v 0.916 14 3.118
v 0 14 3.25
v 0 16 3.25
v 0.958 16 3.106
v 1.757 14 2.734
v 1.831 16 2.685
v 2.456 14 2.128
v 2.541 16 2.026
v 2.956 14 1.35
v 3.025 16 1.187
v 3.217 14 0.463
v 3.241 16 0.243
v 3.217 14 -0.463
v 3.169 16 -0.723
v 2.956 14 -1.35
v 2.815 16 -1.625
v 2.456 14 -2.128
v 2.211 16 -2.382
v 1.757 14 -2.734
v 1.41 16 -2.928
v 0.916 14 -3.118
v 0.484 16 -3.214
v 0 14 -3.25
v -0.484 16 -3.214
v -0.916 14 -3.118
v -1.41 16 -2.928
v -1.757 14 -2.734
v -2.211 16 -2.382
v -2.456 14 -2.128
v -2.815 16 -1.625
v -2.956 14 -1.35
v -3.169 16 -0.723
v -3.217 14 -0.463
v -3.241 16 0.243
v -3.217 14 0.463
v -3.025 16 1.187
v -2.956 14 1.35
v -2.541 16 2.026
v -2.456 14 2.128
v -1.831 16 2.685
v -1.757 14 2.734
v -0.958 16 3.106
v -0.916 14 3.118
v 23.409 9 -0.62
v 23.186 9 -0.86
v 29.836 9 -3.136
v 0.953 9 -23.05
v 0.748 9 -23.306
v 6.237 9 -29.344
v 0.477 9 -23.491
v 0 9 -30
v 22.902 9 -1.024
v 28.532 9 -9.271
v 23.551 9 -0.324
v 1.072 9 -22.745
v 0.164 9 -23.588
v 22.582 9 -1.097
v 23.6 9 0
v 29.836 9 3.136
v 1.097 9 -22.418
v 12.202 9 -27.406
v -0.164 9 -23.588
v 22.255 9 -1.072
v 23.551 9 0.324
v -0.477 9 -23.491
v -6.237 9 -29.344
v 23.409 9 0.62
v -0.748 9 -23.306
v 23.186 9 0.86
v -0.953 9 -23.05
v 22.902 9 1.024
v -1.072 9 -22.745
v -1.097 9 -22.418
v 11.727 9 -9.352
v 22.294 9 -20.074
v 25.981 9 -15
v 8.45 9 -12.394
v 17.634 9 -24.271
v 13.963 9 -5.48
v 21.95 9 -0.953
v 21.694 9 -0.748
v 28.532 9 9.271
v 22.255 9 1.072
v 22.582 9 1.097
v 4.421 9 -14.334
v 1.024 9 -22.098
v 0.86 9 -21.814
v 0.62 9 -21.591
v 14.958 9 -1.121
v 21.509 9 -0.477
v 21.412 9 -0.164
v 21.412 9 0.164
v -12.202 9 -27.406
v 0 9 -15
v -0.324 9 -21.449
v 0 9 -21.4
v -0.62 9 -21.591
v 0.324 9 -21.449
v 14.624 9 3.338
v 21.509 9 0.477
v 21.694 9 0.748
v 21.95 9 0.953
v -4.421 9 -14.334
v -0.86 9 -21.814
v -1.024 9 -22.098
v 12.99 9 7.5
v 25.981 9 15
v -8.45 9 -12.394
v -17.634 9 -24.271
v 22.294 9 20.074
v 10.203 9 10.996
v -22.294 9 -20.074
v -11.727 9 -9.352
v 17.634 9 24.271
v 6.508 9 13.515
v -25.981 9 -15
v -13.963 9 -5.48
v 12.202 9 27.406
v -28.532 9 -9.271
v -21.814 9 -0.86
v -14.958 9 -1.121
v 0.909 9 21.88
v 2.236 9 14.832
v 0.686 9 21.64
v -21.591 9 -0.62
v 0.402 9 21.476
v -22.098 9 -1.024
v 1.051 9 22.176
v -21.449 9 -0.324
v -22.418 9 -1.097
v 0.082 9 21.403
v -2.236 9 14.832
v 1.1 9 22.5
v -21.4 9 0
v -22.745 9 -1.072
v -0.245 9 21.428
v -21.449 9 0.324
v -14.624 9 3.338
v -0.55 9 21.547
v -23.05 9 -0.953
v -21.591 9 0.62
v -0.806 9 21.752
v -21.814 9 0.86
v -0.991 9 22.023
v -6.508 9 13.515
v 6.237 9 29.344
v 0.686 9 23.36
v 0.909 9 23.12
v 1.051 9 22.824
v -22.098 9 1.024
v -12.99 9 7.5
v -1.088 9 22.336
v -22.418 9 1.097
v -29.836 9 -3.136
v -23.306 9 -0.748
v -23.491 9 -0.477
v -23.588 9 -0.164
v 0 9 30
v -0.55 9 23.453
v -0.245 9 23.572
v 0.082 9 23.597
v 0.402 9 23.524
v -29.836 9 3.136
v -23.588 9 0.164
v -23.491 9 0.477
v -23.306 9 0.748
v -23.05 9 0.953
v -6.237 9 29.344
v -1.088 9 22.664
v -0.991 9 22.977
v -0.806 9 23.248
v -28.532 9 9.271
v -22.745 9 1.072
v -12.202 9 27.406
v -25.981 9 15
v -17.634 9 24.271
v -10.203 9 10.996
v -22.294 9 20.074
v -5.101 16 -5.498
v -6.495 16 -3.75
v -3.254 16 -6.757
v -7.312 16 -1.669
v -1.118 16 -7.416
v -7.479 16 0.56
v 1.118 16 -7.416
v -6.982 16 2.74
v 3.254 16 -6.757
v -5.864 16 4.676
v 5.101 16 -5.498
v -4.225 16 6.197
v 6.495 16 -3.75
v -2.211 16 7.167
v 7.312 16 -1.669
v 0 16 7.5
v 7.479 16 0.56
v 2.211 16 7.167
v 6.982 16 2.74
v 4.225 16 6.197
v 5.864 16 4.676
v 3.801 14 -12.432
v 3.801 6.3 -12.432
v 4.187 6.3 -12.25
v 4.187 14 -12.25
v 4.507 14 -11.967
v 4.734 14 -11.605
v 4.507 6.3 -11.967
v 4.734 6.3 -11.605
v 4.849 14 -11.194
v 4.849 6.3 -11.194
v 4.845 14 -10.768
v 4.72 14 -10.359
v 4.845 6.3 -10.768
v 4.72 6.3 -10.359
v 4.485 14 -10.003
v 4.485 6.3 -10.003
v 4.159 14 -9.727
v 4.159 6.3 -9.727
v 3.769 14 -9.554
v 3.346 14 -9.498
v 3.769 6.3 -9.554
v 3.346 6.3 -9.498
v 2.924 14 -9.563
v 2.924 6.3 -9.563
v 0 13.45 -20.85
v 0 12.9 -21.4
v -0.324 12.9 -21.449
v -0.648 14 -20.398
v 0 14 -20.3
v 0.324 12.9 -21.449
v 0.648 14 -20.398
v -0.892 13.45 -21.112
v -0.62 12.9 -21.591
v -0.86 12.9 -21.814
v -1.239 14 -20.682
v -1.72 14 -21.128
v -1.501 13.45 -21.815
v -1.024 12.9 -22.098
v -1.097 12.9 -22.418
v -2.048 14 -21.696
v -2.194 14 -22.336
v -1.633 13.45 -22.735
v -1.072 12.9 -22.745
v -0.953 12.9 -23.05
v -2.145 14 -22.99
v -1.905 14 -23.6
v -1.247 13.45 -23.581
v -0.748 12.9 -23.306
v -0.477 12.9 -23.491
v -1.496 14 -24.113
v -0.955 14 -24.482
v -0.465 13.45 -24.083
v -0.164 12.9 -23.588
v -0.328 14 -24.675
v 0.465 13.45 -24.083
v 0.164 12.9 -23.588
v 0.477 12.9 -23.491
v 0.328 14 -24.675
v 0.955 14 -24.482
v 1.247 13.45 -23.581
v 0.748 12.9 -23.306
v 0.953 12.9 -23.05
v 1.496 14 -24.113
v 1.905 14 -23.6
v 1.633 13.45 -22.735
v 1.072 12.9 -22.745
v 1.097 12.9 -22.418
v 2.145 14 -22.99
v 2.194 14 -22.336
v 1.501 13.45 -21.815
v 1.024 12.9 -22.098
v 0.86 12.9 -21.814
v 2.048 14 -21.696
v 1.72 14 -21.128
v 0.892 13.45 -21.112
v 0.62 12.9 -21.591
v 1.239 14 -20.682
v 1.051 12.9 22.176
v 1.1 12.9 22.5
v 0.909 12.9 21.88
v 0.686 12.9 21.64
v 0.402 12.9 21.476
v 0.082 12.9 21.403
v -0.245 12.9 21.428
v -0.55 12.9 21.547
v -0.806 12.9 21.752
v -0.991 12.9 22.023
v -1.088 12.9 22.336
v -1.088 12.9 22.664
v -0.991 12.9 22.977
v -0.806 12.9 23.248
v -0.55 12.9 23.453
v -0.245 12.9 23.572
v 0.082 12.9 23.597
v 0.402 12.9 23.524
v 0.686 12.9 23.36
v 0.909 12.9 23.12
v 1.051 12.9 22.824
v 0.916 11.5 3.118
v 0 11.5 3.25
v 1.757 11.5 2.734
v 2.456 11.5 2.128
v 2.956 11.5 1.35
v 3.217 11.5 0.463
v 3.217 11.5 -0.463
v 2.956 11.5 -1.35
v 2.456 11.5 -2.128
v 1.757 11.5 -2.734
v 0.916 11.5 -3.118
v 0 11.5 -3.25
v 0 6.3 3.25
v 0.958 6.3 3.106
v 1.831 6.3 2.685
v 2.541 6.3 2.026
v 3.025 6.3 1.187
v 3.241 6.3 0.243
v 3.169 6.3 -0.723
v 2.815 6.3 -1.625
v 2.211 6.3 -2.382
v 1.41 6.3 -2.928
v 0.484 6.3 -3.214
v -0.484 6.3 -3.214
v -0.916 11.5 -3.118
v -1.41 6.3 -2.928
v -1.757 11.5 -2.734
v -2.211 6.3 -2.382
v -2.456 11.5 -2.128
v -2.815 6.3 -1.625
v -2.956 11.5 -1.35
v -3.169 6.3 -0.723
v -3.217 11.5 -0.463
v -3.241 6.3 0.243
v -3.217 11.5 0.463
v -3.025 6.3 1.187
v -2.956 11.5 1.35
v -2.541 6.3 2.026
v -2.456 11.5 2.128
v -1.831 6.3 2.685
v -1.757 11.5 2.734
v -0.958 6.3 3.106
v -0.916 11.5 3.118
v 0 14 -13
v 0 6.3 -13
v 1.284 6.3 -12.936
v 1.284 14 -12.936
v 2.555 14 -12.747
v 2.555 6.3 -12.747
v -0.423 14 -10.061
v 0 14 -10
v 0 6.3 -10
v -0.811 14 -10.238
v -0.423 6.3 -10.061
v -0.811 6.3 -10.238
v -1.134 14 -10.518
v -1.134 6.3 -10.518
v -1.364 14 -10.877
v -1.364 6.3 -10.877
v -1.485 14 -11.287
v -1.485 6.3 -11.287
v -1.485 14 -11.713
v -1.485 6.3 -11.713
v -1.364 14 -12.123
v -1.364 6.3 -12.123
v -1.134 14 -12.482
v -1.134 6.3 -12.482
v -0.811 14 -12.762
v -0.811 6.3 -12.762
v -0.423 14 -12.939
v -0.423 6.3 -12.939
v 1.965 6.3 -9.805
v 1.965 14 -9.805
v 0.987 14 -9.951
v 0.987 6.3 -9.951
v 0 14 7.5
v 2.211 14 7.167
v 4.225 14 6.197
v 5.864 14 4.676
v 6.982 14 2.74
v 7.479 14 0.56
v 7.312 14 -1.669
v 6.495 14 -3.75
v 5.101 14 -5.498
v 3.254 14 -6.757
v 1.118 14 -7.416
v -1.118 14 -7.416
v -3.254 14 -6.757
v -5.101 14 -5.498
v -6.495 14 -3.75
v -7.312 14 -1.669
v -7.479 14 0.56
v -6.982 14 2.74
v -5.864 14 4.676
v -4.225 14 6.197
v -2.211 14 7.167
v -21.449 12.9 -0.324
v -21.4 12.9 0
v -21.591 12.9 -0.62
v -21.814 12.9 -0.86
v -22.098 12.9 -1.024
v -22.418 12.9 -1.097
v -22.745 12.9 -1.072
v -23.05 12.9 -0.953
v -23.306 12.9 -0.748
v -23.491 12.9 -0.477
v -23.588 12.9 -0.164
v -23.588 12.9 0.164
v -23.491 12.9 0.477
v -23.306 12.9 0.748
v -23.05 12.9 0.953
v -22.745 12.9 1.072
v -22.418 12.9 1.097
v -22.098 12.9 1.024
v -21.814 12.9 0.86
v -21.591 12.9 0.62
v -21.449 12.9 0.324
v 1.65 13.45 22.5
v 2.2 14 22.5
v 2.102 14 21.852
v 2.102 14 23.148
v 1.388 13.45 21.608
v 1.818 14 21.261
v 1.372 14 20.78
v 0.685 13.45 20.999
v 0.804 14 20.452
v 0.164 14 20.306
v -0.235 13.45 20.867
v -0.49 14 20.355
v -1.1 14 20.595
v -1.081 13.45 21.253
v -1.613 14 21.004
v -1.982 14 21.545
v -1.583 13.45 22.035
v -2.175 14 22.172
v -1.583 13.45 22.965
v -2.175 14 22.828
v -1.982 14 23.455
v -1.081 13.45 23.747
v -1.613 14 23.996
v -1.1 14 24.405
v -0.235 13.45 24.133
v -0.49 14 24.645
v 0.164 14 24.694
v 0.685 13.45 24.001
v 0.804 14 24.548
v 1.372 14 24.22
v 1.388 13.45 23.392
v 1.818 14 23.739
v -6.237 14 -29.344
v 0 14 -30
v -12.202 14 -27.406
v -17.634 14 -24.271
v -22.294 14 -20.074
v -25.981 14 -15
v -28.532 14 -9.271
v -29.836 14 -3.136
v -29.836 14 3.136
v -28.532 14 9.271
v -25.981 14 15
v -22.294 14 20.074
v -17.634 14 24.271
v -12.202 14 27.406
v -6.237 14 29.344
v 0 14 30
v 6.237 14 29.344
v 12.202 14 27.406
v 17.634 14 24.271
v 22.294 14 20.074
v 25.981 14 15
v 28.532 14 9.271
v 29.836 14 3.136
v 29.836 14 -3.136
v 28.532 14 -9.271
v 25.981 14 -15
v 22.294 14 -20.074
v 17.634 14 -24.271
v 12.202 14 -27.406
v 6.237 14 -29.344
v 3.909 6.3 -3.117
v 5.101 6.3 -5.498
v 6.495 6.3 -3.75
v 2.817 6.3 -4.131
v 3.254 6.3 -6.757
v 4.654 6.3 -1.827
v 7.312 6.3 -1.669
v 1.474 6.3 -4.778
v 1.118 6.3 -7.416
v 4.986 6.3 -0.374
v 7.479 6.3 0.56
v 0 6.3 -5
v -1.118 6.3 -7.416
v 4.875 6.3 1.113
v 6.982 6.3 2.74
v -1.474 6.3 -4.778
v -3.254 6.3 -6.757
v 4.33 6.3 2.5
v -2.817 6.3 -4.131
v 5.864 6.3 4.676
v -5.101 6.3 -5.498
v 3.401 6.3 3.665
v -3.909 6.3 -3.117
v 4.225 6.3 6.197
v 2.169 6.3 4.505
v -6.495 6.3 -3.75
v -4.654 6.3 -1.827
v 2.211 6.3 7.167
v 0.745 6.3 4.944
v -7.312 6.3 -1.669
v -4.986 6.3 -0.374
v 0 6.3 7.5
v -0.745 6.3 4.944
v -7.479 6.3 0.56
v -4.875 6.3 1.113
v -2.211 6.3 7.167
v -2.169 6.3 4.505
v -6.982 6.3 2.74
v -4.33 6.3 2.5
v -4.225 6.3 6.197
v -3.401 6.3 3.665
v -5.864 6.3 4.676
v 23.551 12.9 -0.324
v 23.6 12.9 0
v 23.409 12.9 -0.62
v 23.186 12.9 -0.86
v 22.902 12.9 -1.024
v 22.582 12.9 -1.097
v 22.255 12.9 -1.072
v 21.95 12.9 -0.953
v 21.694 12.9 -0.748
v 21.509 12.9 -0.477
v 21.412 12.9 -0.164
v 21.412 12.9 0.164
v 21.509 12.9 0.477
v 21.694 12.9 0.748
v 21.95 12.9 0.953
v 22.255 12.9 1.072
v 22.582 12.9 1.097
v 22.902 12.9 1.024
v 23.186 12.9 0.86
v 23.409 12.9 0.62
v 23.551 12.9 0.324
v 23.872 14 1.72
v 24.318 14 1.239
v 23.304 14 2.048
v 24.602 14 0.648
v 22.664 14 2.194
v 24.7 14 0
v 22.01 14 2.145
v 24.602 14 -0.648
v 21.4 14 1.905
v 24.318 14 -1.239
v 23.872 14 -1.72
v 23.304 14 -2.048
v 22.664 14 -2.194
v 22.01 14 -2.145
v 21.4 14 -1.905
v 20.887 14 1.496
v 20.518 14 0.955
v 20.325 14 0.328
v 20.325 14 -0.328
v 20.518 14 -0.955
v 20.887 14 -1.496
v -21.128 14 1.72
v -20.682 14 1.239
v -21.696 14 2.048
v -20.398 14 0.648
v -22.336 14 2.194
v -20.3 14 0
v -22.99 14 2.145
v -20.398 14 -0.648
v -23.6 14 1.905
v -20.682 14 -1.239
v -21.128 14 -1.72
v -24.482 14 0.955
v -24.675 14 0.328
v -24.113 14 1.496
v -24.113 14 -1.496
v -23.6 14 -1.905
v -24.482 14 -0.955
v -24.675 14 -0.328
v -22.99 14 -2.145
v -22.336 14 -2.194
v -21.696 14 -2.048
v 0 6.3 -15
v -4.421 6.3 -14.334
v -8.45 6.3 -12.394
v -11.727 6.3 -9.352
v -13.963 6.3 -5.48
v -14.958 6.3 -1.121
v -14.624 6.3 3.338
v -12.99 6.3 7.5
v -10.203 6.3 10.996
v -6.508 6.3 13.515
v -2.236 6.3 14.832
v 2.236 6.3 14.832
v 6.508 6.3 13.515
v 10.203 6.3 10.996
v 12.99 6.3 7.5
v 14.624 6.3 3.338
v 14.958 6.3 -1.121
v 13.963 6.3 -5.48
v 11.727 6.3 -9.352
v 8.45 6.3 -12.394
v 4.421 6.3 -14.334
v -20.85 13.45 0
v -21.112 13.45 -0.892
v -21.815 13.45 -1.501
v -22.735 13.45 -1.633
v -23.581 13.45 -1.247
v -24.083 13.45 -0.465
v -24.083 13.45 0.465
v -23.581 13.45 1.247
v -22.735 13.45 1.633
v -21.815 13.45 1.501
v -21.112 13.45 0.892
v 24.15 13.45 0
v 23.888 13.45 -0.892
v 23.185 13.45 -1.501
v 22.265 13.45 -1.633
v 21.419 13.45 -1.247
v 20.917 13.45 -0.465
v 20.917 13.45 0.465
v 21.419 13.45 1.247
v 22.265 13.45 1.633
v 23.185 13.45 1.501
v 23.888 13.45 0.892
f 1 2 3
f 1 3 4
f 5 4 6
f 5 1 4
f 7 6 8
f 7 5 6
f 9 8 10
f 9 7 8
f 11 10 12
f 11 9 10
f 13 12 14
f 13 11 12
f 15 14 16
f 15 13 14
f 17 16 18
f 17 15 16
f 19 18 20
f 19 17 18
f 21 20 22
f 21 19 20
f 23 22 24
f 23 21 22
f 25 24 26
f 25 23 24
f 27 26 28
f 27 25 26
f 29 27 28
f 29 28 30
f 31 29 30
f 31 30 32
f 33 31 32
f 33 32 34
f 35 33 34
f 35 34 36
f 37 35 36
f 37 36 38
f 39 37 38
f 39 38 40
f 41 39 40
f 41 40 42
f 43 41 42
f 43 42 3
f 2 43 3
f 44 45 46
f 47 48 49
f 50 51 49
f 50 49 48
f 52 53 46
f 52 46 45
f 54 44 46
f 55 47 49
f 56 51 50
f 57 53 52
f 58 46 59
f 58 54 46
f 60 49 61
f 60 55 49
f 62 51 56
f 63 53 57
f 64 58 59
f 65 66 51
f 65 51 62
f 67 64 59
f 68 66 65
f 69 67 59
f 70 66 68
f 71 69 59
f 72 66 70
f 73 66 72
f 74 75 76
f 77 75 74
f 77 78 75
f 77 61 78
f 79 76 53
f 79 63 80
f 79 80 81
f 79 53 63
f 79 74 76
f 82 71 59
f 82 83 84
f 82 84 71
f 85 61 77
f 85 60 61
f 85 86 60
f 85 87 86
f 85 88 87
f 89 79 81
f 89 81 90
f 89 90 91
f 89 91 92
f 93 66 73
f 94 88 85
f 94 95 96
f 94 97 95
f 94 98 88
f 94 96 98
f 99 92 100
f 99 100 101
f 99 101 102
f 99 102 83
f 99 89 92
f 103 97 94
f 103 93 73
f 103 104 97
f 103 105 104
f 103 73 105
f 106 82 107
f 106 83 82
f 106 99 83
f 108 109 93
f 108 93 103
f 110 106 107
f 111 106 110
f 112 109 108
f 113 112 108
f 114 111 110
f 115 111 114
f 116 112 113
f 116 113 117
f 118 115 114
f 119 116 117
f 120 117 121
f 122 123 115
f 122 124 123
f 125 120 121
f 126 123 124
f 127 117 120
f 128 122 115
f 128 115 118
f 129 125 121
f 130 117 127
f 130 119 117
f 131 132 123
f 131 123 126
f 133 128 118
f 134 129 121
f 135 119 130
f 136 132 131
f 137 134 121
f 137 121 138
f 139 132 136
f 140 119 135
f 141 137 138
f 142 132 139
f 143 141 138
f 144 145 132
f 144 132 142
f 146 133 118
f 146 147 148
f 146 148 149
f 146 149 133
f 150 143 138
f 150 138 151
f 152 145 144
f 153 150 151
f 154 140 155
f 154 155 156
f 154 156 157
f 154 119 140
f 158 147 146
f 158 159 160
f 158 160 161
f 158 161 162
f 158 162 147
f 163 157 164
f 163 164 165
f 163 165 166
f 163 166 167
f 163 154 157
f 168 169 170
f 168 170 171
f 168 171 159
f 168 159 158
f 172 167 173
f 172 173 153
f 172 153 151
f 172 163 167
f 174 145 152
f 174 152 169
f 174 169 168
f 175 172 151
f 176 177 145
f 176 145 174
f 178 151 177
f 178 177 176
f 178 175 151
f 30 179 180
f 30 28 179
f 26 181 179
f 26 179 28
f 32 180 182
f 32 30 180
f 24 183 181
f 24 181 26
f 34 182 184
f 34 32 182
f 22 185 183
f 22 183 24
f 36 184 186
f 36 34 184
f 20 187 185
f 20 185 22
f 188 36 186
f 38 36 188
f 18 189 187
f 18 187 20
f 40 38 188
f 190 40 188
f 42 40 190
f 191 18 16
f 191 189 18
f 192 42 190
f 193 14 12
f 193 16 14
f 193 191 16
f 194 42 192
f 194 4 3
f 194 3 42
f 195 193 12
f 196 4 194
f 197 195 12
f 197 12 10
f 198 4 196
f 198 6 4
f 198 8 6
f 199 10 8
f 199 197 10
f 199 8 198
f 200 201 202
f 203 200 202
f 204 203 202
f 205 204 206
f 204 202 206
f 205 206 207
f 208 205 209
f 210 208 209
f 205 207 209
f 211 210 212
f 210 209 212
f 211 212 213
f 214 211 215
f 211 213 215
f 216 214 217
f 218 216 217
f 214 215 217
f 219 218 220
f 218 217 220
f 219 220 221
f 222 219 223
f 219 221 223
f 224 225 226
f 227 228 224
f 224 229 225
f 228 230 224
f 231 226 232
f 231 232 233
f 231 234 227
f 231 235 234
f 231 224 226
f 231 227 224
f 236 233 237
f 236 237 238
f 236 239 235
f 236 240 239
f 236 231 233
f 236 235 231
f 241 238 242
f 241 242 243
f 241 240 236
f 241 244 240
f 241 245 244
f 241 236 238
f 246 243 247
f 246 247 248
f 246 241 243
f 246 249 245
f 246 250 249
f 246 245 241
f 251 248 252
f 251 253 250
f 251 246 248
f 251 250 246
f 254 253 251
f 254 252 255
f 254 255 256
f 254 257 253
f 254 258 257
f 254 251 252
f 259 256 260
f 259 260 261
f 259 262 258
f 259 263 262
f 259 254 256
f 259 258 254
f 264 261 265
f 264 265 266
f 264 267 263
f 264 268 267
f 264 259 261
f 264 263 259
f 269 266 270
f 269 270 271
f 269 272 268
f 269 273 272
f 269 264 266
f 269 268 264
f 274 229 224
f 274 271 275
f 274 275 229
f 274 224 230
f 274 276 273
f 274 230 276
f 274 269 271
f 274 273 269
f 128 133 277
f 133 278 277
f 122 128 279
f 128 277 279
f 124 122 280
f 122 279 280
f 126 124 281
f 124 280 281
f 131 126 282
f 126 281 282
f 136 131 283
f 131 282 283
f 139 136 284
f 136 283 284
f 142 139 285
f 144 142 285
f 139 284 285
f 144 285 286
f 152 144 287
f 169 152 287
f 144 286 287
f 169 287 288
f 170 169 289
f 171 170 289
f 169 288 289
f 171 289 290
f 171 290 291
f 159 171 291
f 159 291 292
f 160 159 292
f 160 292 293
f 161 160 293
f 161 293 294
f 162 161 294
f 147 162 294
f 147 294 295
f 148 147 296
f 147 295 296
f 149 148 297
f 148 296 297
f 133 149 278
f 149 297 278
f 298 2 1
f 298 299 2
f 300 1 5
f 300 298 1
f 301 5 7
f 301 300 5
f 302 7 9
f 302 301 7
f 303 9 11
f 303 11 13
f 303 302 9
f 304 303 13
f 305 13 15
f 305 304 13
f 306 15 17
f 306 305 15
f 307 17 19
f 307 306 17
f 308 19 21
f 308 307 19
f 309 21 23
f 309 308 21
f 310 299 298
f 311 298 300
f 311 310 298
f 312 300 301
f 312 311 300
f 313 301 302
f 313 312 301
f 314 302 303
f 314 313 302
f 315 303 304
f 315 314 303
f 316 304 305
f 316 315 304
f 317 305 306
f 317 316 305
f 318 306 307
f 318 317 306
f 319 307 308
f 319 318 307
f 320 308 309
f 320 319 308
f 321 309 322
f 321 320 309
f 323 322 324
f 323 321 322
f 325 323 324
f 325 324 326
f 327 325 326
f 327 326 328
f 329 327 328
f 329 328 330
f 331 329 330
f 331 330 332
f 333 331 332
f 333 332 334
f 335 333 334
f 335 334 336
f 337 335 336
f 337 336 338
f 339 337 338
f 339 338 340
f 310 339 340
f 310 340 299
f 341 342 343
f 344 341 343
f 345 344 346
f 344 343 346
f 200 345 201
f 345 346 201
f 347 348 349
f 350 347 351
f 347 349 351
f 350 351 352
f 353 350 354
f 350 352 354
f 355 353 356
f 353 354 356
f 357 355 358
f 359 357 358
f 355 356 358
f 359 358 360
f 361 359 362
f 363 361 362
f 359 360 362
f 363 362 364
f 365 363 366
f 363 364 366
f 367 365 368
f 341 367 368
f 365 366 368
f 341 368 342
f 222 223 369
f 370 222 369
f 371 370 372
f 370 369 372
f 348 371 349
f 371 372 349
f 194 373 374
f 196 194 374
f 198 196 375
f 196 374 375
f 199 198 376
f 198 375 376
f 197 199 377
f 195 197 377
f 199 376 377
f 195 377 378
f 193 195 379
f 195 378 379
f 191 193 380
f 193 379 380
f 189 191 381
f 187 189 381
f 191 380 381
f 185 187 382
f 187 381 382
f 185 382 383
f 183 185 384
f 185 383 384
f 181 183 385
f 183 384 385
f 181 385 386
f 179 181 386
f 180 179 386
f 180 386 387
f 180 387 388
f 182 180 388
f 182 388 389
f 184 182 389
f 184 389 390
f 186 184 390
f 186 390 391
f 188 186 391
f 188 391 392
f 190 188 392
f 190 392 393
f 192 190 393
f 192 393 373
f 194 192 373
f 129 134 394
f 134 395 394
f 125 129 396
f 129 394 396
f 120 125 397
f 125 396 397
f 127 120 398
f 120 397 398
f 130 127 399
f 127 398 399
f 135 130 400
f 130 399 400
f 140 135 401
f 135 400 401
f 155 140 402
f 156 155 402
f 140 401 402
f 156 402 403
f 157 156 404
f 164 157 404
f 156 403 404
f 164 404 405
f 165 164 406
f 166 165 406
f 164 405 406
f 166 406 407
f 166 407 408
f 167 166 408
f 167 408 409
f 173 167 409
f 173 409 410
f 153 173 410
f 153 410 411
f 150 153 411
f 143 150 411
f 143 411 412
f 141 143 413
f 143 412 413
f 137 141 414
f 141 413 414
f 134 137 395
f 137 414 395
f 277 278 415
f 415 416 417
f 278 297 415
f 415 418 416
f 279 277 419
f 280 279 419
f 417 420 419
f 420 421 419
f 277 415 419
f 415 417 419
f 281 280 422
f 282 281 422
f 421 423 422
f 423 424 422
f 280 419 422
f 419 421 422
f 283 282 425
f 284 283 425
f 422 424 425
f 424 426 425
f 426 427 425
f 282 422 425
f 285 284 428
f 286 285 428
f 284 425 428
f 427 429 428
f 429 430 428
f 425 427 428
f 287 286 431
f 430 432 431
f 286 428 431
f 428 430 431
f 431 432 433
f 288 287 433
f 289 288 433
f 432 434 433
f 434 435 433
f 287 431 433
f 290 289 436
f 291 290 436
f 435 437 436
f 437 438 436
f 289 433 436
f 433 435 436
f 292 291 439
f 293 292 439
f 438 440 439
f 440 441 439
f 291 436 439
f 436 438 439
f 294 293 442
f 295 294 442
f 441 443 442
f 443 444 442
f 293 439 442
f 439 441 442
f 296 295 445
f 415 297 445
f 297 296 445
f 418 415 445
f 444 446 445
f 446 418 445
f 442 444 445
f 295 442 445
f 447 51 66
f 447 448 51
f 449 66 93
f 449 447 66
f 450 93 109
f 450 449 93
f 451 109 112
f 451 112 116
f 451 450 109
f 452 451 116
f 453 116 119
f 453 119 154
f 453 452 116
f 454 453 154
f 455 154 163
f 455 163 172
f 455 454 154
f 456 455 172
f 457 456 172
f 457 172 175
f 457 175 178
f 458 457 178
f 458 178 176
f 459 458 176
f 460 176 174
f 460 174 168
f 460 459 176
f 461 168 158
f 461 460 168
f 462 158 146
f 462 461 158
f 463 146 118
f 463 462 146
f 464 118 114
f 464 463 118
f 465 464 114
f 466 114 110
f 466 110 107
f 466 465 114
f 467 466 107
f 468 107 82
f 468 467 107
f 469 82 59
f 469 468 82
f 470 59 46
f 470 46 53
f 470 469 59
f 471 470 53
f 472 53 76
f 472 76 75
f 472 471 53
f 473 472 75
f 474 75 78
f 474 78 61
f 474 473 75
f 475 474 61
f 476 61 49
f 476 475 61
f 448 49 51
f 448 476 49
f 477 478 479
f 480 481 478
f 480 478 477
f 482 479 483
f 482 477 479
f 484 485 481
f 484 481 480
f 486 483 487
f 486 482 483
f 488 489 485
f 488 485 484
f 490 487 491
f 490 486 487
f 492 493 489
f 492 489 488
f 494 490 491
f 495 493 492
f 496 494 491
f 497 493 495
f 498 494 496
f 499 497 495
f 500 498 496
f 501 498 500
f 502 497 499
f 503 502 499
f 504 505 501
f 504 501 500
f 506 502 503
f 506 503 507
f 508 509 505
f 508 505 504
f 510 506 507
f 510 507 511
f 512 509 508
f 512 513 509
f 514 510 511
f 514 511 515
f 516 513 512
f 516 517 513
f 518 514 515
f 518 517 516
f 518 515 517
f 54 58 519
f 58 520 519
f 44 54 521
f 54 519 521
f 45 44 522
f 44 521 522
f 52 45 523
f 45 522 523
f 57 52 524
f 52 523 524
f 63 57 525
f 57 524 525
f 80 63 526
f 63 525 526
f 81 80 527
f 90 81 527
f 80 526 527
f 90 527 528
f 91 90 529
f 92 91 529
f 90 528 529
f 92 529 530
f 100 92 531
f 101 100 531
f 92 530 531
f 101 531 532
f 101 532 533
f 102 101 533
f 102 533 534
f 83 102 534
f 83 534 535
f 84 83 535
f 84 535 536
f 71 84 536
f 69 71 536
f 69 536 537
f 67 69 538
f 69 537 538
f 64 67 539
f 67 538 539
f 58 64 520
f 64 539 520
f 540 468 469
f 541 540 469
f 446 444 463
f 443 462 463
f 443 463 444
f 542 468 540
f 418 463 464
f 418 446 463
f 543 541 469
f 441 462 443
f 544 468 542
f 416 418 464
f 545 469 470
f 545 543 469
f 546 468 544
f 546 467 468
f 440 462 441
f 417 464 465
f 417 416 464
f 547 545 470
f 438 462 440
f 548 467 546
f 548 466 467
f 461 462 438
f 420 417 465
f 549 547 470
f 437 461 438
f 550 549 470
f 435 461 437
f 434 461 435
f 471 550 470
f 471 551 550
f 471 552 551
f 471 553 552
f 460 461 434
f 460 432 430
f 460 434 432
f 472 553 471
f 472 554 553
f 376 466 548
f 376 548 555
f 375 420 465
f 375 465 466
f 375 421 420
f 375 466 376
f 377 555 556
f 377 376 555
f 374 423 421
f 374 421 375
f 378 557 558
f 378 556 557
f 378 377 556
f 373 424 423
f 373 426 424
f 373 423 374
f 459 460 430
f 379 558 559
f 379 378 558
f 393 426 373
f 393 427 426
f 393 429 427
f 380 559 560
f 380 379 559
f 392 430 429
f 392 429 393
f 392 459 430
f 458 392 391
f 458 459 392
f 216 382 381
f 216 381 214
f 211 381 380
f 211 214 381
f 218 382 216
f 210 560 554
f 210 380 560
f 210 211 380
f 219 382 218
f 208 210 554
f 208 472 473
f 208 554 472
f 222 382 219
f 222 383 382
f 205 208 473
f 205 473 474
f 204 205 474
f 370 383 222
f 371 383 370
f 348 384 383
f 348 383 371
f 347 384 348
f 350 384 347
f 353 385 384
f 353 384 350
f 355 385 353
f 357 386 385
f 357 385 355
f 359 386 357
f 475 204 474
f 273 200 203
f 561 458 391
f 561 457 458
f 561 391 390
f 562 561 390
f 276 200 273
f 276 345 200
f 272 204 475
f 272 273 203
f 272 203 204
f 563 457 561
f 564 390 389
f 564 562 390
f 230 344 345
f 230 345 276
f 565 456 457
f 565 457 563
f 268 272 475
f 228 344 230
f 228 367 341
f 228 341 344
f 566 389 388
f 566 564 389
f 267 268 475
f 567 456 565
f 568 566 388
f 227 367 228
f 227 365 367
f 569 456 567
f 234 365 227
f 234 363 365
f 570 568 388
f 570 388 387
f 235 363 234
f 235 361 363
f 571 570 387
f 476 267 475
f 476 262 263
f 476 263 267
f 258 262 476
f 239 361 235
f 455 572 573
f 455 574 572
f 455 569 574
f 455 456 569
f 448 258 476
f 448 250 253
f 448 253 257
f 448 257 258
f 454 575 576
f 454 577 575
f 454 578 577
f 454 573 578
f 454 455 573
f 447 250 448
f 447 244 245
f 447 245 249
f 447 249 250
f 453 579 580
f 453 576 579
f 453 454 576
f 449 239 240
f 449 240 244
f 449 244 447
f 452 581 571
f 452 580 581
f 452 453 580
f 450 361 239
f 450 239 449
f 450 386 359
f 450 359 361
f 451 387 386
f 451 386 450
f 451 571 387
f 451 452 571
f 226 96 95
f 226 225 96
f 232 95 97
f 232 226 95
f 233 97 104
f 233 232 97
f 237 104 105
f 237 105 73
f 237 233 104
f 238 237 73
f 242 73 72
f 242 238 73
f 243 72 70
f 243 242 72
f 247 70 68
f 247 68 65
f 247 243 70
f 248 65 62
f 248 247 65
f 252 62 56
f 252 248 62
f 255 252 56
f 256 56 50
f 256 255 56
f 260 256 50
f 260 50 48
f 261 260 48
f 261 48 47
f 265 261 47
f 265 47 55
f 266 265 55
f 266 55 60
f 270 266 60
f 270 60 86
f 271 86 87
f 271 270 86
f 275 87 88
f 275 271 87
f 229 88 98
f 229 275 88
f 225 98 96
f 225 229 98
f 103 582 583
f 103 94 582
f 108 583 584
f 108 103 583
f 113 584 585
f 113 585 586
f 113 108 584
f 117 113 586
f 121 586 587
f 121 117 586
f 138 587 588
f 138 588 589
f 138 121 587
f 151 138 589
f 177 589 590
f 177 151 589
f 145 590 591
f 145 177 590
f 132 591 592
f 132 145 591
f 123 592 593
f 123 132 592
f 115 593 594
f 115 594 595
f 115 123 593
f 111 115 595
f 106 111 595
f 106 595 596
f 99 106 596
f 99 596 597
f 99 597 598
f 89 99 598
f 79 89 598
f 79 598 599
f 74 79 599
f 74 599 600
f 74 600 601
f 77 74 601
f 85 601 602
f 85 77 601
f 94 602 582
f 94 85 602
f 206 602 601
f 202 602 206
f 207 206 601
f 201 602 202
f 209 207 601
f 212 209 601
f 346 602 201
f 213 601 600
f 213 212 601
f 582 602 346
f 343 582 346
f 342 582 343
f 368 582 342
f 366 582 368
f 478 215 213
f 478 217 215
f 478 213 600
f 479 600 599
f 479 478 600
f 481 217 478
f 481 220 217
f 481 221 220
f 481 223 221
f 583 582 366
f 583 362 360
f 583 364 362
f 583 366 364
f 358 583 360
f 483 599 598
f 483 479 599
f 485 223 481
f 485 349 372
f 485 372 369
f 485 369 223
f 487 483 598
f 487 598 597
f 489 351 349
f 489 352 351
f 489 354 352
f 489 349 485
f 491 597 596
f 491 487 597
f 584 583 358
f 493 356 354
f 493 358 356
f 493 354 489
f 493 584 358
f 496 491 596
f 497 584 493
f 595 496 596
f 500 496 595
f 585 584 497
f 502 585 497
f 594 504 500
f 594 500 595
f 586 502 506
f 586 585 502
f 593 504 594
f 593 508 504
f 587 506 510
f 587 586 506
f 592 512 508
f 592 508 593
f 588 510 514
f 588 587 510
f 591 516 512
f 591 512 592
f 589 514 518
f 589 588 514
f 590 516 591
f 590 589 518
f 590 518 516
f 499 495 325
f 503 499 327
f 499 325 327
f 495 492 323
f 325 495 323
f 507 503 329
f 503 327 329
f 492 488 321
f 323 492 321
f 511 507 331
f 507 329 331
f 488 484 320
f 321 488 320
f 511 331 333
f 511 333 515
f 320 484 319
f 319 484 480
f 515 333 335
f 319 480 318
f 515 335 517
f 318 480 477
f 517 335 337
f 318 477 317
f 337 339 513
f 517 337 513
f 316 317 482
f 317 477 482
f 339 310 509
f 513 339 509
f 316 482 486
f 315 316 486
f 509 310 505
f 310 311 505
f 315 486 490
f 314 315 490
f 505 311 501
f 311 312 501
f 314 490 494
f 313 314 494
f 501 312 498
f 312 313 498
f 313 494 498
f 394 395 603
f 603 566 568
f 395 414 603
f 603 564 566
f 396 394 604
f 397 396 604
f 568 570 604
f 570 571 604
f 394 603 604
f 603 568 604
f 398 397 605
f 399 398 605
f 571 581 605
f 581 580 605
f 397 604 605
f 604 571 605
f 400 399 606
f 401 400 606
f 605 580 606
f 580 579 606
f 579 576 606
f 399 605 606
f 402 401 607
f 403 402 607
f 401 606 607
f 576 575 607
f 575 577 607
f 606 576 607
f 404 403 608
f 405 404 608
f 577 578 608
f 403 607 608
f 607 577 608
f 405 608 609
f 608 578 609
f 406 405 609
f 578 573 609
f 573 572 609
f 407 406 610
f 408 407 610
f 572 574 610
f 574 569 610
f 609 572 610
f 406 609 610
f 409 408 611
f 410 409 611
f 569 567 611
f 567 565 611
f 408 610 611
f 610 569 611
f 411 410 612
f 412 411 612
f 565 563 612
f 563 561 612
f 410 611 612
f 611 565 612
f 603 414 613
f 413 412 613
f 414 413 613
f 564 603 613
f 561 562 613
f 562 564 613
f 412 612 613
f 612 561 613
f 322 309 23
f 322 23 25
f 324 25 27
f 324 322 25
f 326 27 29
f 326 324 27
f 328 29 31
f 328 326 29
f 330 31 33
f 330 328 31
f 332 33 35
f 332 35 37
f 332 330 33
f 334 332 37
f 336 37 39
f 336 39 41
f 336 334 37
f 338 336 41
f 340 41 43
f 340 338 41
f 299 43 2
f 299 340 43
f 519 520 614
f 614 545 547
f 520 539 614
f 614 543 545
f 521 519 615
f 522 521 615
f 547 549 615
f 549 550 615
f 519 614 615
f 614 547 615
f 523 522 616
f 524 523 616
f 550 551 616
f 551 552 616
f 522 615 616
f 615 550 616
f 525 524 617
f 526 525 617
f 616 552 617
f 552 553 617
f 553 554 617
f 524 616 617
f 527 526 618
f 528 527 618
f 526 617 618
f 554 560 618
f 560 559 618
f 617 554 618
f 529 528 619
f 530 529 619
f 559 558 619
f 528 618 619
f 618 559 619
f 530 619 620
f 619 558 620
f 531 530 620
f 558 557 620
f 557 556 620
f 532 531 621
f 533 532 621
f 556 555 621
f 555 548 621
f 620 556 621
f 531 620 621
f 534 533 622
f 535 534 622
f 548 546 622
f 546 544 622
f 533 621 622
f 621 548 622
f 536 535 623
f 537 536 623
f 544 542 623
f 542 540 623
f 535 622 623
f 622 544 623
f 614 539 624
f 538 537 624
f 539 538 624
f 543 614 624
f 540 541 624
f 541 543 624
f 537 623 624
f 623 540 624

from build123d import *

# Parameters (mm, degrees)
CORTE_EXTRUS_O3_REACH         = 46.677
RESSALTO_EXTRUS_O1_DEPTH      = 2
RESSALTO_EXTRUS_O1_DEPTH_BACK = 7.7
ESBO_O4_R                     = 7.5
ESBO_O4_R_2                   = 3.25


# Read off the part's stored shape, not the designer's step: PadrãoCircular1
with BuildPart() as part:
    # Esboço1 → Revolução1 (revolve)
    with BuildSketch(Plane.XY, mode=Mode.PRIVATE) as revolu_o1_sk:
        Polygon((3.25, 14), (3.25, 11.5), (5, 11.5), (5, 6.3), (15, 6.3), (15, 9), (30, 9), (30, 14), align=None)
    revolve(revolu_o1_sk.sketch.rotate(Axis((0, 0, 0), (0, 1, 0)), 90), axis=Axis((0, 0, 0), (0, 1, 0)))

    # Esboço2 → Corte-extrusão3 (cut, up to next)
    with BuildSketch(Plane(origin=(0, 0, 0), x_dir=(1, 0, 0), z_dir=(0, 1, 0)), mode=Mode.PRIVATE) as corte_extrus_o3_sk1:
        with BuildLine():
            ThreePointArc((2.923717047, 9.56304756), (1.478094111, 9.890158634), (0, 10))
            ThreePointArc((0, 10), (-1.5, 11.5), (0, 13))
            ThreePointArc((0, 13), (1.921522345, 12.857206224), (3.800832161, 12.431961828))
            ThreePointArc((3.800832161, 12.431961828), (4.796731738, 10.558947136), (2.923717047, 9.56304756))
        make_face()
    corte_extrus_o3_tool1 = extrude(corte_extrus_o3_sk1.sketch, amount=CORTE_EXTRUS_O3_REACH, mode=Mode.PRIVATE) & part.part
    add(corte_extrus_o3_tool1.solids().sort_by_distance((1.688498, 0, -11.298001))[0], mode=Mode.SUBTRACT)

    # Esboço4 → Ressalto-extrusão1 (add, two sides: drawn at the far end of the back side and taken through both)
    with BuildSketch(Plane(origin=(0, 14, 0), x_dir=(1, 0, 0), z_dir=(0, 1, 0)).offset(-RESSALTO_EXTRUS_O1_DEPTH_BACK)):
        with Locations(Location((0, 0, 0), (0, 0, 270))):
            Circle(ESBO_O4_R)
        with Locations(Location((0, 0, 0), (0, 0, 270))):
            Circle(ESBO_O4_R_2, mode=Mode.SUBTRACT)
    extrude(amount=RESSALTO_EXTRUS_O1_DEPTH + RESSALTO_EXTRUS_O1_DEPTH_BACK)

    # Esboço10 → Escareado para parafuso de máquina com cabeça chata de M21 (revolve, cut)
    with BuildSketch(Plane(origin=(0, 14, -22.5), x_dir=(0, 0, 1), z_dir=(1, 0, 0))):
        Polygon((0, 0), (0, 5.660946681), (1.1, 5), (1.1, 1.1), (2.2, 0), align=None)
    revolve(axis=Axis((0, 20.35, -22.5), (0, -1, 0)), mode=Mode.SUBTRACT)

    # PadrãoCircular1 outline → PadrãoCircular1 (revolve, cut)
    with BuildSketch(Plane(origin=(22.5, 0, 0), x_dir=(1, 0, 0), z_dir=(0, 0, 1))):
        Polygon((0, 9), (1.1, 9), (1.1, 12.9), (2.2, 14), (0, 14), align=None)
    revolve(axis=Axis((22.5, 0, 0), (0, 1, 0)), mode=Mode.SUBTRACT)

    # Padr_oCircular1 2 outline → Padr_oCircular1 2 (revolve, cut)
    with BuildSketch(Plane.XY.offset(22.5)):
        Polygon((0, 9), (1.1, 9), (1.1, 12.9), (2.2, 14), (0, 14), align=None)
    revolve(axis=Axis((0, 0, 22.5), (0, 1, 0)), mode=Mode.SUBTRACT)

    # Padr_oCircular1 3 outline → Padr_oCircular1 3 (revolve, cut)
    with BuildSketch(Plane(origin=(-22.5, 0, 0), x_dir=(1, 0, 0), z_dir=(0, 0, 1))):
        Polygon((0, 9), (1.1, 9), (1.1, 12.9), (2.2, 14), (0, 14), align=None)
    revolve(axis=Axis((-22.5, 0, 0), (0, 1, 0)), mode=Mode.SUBTRACT)


solid = part.part
